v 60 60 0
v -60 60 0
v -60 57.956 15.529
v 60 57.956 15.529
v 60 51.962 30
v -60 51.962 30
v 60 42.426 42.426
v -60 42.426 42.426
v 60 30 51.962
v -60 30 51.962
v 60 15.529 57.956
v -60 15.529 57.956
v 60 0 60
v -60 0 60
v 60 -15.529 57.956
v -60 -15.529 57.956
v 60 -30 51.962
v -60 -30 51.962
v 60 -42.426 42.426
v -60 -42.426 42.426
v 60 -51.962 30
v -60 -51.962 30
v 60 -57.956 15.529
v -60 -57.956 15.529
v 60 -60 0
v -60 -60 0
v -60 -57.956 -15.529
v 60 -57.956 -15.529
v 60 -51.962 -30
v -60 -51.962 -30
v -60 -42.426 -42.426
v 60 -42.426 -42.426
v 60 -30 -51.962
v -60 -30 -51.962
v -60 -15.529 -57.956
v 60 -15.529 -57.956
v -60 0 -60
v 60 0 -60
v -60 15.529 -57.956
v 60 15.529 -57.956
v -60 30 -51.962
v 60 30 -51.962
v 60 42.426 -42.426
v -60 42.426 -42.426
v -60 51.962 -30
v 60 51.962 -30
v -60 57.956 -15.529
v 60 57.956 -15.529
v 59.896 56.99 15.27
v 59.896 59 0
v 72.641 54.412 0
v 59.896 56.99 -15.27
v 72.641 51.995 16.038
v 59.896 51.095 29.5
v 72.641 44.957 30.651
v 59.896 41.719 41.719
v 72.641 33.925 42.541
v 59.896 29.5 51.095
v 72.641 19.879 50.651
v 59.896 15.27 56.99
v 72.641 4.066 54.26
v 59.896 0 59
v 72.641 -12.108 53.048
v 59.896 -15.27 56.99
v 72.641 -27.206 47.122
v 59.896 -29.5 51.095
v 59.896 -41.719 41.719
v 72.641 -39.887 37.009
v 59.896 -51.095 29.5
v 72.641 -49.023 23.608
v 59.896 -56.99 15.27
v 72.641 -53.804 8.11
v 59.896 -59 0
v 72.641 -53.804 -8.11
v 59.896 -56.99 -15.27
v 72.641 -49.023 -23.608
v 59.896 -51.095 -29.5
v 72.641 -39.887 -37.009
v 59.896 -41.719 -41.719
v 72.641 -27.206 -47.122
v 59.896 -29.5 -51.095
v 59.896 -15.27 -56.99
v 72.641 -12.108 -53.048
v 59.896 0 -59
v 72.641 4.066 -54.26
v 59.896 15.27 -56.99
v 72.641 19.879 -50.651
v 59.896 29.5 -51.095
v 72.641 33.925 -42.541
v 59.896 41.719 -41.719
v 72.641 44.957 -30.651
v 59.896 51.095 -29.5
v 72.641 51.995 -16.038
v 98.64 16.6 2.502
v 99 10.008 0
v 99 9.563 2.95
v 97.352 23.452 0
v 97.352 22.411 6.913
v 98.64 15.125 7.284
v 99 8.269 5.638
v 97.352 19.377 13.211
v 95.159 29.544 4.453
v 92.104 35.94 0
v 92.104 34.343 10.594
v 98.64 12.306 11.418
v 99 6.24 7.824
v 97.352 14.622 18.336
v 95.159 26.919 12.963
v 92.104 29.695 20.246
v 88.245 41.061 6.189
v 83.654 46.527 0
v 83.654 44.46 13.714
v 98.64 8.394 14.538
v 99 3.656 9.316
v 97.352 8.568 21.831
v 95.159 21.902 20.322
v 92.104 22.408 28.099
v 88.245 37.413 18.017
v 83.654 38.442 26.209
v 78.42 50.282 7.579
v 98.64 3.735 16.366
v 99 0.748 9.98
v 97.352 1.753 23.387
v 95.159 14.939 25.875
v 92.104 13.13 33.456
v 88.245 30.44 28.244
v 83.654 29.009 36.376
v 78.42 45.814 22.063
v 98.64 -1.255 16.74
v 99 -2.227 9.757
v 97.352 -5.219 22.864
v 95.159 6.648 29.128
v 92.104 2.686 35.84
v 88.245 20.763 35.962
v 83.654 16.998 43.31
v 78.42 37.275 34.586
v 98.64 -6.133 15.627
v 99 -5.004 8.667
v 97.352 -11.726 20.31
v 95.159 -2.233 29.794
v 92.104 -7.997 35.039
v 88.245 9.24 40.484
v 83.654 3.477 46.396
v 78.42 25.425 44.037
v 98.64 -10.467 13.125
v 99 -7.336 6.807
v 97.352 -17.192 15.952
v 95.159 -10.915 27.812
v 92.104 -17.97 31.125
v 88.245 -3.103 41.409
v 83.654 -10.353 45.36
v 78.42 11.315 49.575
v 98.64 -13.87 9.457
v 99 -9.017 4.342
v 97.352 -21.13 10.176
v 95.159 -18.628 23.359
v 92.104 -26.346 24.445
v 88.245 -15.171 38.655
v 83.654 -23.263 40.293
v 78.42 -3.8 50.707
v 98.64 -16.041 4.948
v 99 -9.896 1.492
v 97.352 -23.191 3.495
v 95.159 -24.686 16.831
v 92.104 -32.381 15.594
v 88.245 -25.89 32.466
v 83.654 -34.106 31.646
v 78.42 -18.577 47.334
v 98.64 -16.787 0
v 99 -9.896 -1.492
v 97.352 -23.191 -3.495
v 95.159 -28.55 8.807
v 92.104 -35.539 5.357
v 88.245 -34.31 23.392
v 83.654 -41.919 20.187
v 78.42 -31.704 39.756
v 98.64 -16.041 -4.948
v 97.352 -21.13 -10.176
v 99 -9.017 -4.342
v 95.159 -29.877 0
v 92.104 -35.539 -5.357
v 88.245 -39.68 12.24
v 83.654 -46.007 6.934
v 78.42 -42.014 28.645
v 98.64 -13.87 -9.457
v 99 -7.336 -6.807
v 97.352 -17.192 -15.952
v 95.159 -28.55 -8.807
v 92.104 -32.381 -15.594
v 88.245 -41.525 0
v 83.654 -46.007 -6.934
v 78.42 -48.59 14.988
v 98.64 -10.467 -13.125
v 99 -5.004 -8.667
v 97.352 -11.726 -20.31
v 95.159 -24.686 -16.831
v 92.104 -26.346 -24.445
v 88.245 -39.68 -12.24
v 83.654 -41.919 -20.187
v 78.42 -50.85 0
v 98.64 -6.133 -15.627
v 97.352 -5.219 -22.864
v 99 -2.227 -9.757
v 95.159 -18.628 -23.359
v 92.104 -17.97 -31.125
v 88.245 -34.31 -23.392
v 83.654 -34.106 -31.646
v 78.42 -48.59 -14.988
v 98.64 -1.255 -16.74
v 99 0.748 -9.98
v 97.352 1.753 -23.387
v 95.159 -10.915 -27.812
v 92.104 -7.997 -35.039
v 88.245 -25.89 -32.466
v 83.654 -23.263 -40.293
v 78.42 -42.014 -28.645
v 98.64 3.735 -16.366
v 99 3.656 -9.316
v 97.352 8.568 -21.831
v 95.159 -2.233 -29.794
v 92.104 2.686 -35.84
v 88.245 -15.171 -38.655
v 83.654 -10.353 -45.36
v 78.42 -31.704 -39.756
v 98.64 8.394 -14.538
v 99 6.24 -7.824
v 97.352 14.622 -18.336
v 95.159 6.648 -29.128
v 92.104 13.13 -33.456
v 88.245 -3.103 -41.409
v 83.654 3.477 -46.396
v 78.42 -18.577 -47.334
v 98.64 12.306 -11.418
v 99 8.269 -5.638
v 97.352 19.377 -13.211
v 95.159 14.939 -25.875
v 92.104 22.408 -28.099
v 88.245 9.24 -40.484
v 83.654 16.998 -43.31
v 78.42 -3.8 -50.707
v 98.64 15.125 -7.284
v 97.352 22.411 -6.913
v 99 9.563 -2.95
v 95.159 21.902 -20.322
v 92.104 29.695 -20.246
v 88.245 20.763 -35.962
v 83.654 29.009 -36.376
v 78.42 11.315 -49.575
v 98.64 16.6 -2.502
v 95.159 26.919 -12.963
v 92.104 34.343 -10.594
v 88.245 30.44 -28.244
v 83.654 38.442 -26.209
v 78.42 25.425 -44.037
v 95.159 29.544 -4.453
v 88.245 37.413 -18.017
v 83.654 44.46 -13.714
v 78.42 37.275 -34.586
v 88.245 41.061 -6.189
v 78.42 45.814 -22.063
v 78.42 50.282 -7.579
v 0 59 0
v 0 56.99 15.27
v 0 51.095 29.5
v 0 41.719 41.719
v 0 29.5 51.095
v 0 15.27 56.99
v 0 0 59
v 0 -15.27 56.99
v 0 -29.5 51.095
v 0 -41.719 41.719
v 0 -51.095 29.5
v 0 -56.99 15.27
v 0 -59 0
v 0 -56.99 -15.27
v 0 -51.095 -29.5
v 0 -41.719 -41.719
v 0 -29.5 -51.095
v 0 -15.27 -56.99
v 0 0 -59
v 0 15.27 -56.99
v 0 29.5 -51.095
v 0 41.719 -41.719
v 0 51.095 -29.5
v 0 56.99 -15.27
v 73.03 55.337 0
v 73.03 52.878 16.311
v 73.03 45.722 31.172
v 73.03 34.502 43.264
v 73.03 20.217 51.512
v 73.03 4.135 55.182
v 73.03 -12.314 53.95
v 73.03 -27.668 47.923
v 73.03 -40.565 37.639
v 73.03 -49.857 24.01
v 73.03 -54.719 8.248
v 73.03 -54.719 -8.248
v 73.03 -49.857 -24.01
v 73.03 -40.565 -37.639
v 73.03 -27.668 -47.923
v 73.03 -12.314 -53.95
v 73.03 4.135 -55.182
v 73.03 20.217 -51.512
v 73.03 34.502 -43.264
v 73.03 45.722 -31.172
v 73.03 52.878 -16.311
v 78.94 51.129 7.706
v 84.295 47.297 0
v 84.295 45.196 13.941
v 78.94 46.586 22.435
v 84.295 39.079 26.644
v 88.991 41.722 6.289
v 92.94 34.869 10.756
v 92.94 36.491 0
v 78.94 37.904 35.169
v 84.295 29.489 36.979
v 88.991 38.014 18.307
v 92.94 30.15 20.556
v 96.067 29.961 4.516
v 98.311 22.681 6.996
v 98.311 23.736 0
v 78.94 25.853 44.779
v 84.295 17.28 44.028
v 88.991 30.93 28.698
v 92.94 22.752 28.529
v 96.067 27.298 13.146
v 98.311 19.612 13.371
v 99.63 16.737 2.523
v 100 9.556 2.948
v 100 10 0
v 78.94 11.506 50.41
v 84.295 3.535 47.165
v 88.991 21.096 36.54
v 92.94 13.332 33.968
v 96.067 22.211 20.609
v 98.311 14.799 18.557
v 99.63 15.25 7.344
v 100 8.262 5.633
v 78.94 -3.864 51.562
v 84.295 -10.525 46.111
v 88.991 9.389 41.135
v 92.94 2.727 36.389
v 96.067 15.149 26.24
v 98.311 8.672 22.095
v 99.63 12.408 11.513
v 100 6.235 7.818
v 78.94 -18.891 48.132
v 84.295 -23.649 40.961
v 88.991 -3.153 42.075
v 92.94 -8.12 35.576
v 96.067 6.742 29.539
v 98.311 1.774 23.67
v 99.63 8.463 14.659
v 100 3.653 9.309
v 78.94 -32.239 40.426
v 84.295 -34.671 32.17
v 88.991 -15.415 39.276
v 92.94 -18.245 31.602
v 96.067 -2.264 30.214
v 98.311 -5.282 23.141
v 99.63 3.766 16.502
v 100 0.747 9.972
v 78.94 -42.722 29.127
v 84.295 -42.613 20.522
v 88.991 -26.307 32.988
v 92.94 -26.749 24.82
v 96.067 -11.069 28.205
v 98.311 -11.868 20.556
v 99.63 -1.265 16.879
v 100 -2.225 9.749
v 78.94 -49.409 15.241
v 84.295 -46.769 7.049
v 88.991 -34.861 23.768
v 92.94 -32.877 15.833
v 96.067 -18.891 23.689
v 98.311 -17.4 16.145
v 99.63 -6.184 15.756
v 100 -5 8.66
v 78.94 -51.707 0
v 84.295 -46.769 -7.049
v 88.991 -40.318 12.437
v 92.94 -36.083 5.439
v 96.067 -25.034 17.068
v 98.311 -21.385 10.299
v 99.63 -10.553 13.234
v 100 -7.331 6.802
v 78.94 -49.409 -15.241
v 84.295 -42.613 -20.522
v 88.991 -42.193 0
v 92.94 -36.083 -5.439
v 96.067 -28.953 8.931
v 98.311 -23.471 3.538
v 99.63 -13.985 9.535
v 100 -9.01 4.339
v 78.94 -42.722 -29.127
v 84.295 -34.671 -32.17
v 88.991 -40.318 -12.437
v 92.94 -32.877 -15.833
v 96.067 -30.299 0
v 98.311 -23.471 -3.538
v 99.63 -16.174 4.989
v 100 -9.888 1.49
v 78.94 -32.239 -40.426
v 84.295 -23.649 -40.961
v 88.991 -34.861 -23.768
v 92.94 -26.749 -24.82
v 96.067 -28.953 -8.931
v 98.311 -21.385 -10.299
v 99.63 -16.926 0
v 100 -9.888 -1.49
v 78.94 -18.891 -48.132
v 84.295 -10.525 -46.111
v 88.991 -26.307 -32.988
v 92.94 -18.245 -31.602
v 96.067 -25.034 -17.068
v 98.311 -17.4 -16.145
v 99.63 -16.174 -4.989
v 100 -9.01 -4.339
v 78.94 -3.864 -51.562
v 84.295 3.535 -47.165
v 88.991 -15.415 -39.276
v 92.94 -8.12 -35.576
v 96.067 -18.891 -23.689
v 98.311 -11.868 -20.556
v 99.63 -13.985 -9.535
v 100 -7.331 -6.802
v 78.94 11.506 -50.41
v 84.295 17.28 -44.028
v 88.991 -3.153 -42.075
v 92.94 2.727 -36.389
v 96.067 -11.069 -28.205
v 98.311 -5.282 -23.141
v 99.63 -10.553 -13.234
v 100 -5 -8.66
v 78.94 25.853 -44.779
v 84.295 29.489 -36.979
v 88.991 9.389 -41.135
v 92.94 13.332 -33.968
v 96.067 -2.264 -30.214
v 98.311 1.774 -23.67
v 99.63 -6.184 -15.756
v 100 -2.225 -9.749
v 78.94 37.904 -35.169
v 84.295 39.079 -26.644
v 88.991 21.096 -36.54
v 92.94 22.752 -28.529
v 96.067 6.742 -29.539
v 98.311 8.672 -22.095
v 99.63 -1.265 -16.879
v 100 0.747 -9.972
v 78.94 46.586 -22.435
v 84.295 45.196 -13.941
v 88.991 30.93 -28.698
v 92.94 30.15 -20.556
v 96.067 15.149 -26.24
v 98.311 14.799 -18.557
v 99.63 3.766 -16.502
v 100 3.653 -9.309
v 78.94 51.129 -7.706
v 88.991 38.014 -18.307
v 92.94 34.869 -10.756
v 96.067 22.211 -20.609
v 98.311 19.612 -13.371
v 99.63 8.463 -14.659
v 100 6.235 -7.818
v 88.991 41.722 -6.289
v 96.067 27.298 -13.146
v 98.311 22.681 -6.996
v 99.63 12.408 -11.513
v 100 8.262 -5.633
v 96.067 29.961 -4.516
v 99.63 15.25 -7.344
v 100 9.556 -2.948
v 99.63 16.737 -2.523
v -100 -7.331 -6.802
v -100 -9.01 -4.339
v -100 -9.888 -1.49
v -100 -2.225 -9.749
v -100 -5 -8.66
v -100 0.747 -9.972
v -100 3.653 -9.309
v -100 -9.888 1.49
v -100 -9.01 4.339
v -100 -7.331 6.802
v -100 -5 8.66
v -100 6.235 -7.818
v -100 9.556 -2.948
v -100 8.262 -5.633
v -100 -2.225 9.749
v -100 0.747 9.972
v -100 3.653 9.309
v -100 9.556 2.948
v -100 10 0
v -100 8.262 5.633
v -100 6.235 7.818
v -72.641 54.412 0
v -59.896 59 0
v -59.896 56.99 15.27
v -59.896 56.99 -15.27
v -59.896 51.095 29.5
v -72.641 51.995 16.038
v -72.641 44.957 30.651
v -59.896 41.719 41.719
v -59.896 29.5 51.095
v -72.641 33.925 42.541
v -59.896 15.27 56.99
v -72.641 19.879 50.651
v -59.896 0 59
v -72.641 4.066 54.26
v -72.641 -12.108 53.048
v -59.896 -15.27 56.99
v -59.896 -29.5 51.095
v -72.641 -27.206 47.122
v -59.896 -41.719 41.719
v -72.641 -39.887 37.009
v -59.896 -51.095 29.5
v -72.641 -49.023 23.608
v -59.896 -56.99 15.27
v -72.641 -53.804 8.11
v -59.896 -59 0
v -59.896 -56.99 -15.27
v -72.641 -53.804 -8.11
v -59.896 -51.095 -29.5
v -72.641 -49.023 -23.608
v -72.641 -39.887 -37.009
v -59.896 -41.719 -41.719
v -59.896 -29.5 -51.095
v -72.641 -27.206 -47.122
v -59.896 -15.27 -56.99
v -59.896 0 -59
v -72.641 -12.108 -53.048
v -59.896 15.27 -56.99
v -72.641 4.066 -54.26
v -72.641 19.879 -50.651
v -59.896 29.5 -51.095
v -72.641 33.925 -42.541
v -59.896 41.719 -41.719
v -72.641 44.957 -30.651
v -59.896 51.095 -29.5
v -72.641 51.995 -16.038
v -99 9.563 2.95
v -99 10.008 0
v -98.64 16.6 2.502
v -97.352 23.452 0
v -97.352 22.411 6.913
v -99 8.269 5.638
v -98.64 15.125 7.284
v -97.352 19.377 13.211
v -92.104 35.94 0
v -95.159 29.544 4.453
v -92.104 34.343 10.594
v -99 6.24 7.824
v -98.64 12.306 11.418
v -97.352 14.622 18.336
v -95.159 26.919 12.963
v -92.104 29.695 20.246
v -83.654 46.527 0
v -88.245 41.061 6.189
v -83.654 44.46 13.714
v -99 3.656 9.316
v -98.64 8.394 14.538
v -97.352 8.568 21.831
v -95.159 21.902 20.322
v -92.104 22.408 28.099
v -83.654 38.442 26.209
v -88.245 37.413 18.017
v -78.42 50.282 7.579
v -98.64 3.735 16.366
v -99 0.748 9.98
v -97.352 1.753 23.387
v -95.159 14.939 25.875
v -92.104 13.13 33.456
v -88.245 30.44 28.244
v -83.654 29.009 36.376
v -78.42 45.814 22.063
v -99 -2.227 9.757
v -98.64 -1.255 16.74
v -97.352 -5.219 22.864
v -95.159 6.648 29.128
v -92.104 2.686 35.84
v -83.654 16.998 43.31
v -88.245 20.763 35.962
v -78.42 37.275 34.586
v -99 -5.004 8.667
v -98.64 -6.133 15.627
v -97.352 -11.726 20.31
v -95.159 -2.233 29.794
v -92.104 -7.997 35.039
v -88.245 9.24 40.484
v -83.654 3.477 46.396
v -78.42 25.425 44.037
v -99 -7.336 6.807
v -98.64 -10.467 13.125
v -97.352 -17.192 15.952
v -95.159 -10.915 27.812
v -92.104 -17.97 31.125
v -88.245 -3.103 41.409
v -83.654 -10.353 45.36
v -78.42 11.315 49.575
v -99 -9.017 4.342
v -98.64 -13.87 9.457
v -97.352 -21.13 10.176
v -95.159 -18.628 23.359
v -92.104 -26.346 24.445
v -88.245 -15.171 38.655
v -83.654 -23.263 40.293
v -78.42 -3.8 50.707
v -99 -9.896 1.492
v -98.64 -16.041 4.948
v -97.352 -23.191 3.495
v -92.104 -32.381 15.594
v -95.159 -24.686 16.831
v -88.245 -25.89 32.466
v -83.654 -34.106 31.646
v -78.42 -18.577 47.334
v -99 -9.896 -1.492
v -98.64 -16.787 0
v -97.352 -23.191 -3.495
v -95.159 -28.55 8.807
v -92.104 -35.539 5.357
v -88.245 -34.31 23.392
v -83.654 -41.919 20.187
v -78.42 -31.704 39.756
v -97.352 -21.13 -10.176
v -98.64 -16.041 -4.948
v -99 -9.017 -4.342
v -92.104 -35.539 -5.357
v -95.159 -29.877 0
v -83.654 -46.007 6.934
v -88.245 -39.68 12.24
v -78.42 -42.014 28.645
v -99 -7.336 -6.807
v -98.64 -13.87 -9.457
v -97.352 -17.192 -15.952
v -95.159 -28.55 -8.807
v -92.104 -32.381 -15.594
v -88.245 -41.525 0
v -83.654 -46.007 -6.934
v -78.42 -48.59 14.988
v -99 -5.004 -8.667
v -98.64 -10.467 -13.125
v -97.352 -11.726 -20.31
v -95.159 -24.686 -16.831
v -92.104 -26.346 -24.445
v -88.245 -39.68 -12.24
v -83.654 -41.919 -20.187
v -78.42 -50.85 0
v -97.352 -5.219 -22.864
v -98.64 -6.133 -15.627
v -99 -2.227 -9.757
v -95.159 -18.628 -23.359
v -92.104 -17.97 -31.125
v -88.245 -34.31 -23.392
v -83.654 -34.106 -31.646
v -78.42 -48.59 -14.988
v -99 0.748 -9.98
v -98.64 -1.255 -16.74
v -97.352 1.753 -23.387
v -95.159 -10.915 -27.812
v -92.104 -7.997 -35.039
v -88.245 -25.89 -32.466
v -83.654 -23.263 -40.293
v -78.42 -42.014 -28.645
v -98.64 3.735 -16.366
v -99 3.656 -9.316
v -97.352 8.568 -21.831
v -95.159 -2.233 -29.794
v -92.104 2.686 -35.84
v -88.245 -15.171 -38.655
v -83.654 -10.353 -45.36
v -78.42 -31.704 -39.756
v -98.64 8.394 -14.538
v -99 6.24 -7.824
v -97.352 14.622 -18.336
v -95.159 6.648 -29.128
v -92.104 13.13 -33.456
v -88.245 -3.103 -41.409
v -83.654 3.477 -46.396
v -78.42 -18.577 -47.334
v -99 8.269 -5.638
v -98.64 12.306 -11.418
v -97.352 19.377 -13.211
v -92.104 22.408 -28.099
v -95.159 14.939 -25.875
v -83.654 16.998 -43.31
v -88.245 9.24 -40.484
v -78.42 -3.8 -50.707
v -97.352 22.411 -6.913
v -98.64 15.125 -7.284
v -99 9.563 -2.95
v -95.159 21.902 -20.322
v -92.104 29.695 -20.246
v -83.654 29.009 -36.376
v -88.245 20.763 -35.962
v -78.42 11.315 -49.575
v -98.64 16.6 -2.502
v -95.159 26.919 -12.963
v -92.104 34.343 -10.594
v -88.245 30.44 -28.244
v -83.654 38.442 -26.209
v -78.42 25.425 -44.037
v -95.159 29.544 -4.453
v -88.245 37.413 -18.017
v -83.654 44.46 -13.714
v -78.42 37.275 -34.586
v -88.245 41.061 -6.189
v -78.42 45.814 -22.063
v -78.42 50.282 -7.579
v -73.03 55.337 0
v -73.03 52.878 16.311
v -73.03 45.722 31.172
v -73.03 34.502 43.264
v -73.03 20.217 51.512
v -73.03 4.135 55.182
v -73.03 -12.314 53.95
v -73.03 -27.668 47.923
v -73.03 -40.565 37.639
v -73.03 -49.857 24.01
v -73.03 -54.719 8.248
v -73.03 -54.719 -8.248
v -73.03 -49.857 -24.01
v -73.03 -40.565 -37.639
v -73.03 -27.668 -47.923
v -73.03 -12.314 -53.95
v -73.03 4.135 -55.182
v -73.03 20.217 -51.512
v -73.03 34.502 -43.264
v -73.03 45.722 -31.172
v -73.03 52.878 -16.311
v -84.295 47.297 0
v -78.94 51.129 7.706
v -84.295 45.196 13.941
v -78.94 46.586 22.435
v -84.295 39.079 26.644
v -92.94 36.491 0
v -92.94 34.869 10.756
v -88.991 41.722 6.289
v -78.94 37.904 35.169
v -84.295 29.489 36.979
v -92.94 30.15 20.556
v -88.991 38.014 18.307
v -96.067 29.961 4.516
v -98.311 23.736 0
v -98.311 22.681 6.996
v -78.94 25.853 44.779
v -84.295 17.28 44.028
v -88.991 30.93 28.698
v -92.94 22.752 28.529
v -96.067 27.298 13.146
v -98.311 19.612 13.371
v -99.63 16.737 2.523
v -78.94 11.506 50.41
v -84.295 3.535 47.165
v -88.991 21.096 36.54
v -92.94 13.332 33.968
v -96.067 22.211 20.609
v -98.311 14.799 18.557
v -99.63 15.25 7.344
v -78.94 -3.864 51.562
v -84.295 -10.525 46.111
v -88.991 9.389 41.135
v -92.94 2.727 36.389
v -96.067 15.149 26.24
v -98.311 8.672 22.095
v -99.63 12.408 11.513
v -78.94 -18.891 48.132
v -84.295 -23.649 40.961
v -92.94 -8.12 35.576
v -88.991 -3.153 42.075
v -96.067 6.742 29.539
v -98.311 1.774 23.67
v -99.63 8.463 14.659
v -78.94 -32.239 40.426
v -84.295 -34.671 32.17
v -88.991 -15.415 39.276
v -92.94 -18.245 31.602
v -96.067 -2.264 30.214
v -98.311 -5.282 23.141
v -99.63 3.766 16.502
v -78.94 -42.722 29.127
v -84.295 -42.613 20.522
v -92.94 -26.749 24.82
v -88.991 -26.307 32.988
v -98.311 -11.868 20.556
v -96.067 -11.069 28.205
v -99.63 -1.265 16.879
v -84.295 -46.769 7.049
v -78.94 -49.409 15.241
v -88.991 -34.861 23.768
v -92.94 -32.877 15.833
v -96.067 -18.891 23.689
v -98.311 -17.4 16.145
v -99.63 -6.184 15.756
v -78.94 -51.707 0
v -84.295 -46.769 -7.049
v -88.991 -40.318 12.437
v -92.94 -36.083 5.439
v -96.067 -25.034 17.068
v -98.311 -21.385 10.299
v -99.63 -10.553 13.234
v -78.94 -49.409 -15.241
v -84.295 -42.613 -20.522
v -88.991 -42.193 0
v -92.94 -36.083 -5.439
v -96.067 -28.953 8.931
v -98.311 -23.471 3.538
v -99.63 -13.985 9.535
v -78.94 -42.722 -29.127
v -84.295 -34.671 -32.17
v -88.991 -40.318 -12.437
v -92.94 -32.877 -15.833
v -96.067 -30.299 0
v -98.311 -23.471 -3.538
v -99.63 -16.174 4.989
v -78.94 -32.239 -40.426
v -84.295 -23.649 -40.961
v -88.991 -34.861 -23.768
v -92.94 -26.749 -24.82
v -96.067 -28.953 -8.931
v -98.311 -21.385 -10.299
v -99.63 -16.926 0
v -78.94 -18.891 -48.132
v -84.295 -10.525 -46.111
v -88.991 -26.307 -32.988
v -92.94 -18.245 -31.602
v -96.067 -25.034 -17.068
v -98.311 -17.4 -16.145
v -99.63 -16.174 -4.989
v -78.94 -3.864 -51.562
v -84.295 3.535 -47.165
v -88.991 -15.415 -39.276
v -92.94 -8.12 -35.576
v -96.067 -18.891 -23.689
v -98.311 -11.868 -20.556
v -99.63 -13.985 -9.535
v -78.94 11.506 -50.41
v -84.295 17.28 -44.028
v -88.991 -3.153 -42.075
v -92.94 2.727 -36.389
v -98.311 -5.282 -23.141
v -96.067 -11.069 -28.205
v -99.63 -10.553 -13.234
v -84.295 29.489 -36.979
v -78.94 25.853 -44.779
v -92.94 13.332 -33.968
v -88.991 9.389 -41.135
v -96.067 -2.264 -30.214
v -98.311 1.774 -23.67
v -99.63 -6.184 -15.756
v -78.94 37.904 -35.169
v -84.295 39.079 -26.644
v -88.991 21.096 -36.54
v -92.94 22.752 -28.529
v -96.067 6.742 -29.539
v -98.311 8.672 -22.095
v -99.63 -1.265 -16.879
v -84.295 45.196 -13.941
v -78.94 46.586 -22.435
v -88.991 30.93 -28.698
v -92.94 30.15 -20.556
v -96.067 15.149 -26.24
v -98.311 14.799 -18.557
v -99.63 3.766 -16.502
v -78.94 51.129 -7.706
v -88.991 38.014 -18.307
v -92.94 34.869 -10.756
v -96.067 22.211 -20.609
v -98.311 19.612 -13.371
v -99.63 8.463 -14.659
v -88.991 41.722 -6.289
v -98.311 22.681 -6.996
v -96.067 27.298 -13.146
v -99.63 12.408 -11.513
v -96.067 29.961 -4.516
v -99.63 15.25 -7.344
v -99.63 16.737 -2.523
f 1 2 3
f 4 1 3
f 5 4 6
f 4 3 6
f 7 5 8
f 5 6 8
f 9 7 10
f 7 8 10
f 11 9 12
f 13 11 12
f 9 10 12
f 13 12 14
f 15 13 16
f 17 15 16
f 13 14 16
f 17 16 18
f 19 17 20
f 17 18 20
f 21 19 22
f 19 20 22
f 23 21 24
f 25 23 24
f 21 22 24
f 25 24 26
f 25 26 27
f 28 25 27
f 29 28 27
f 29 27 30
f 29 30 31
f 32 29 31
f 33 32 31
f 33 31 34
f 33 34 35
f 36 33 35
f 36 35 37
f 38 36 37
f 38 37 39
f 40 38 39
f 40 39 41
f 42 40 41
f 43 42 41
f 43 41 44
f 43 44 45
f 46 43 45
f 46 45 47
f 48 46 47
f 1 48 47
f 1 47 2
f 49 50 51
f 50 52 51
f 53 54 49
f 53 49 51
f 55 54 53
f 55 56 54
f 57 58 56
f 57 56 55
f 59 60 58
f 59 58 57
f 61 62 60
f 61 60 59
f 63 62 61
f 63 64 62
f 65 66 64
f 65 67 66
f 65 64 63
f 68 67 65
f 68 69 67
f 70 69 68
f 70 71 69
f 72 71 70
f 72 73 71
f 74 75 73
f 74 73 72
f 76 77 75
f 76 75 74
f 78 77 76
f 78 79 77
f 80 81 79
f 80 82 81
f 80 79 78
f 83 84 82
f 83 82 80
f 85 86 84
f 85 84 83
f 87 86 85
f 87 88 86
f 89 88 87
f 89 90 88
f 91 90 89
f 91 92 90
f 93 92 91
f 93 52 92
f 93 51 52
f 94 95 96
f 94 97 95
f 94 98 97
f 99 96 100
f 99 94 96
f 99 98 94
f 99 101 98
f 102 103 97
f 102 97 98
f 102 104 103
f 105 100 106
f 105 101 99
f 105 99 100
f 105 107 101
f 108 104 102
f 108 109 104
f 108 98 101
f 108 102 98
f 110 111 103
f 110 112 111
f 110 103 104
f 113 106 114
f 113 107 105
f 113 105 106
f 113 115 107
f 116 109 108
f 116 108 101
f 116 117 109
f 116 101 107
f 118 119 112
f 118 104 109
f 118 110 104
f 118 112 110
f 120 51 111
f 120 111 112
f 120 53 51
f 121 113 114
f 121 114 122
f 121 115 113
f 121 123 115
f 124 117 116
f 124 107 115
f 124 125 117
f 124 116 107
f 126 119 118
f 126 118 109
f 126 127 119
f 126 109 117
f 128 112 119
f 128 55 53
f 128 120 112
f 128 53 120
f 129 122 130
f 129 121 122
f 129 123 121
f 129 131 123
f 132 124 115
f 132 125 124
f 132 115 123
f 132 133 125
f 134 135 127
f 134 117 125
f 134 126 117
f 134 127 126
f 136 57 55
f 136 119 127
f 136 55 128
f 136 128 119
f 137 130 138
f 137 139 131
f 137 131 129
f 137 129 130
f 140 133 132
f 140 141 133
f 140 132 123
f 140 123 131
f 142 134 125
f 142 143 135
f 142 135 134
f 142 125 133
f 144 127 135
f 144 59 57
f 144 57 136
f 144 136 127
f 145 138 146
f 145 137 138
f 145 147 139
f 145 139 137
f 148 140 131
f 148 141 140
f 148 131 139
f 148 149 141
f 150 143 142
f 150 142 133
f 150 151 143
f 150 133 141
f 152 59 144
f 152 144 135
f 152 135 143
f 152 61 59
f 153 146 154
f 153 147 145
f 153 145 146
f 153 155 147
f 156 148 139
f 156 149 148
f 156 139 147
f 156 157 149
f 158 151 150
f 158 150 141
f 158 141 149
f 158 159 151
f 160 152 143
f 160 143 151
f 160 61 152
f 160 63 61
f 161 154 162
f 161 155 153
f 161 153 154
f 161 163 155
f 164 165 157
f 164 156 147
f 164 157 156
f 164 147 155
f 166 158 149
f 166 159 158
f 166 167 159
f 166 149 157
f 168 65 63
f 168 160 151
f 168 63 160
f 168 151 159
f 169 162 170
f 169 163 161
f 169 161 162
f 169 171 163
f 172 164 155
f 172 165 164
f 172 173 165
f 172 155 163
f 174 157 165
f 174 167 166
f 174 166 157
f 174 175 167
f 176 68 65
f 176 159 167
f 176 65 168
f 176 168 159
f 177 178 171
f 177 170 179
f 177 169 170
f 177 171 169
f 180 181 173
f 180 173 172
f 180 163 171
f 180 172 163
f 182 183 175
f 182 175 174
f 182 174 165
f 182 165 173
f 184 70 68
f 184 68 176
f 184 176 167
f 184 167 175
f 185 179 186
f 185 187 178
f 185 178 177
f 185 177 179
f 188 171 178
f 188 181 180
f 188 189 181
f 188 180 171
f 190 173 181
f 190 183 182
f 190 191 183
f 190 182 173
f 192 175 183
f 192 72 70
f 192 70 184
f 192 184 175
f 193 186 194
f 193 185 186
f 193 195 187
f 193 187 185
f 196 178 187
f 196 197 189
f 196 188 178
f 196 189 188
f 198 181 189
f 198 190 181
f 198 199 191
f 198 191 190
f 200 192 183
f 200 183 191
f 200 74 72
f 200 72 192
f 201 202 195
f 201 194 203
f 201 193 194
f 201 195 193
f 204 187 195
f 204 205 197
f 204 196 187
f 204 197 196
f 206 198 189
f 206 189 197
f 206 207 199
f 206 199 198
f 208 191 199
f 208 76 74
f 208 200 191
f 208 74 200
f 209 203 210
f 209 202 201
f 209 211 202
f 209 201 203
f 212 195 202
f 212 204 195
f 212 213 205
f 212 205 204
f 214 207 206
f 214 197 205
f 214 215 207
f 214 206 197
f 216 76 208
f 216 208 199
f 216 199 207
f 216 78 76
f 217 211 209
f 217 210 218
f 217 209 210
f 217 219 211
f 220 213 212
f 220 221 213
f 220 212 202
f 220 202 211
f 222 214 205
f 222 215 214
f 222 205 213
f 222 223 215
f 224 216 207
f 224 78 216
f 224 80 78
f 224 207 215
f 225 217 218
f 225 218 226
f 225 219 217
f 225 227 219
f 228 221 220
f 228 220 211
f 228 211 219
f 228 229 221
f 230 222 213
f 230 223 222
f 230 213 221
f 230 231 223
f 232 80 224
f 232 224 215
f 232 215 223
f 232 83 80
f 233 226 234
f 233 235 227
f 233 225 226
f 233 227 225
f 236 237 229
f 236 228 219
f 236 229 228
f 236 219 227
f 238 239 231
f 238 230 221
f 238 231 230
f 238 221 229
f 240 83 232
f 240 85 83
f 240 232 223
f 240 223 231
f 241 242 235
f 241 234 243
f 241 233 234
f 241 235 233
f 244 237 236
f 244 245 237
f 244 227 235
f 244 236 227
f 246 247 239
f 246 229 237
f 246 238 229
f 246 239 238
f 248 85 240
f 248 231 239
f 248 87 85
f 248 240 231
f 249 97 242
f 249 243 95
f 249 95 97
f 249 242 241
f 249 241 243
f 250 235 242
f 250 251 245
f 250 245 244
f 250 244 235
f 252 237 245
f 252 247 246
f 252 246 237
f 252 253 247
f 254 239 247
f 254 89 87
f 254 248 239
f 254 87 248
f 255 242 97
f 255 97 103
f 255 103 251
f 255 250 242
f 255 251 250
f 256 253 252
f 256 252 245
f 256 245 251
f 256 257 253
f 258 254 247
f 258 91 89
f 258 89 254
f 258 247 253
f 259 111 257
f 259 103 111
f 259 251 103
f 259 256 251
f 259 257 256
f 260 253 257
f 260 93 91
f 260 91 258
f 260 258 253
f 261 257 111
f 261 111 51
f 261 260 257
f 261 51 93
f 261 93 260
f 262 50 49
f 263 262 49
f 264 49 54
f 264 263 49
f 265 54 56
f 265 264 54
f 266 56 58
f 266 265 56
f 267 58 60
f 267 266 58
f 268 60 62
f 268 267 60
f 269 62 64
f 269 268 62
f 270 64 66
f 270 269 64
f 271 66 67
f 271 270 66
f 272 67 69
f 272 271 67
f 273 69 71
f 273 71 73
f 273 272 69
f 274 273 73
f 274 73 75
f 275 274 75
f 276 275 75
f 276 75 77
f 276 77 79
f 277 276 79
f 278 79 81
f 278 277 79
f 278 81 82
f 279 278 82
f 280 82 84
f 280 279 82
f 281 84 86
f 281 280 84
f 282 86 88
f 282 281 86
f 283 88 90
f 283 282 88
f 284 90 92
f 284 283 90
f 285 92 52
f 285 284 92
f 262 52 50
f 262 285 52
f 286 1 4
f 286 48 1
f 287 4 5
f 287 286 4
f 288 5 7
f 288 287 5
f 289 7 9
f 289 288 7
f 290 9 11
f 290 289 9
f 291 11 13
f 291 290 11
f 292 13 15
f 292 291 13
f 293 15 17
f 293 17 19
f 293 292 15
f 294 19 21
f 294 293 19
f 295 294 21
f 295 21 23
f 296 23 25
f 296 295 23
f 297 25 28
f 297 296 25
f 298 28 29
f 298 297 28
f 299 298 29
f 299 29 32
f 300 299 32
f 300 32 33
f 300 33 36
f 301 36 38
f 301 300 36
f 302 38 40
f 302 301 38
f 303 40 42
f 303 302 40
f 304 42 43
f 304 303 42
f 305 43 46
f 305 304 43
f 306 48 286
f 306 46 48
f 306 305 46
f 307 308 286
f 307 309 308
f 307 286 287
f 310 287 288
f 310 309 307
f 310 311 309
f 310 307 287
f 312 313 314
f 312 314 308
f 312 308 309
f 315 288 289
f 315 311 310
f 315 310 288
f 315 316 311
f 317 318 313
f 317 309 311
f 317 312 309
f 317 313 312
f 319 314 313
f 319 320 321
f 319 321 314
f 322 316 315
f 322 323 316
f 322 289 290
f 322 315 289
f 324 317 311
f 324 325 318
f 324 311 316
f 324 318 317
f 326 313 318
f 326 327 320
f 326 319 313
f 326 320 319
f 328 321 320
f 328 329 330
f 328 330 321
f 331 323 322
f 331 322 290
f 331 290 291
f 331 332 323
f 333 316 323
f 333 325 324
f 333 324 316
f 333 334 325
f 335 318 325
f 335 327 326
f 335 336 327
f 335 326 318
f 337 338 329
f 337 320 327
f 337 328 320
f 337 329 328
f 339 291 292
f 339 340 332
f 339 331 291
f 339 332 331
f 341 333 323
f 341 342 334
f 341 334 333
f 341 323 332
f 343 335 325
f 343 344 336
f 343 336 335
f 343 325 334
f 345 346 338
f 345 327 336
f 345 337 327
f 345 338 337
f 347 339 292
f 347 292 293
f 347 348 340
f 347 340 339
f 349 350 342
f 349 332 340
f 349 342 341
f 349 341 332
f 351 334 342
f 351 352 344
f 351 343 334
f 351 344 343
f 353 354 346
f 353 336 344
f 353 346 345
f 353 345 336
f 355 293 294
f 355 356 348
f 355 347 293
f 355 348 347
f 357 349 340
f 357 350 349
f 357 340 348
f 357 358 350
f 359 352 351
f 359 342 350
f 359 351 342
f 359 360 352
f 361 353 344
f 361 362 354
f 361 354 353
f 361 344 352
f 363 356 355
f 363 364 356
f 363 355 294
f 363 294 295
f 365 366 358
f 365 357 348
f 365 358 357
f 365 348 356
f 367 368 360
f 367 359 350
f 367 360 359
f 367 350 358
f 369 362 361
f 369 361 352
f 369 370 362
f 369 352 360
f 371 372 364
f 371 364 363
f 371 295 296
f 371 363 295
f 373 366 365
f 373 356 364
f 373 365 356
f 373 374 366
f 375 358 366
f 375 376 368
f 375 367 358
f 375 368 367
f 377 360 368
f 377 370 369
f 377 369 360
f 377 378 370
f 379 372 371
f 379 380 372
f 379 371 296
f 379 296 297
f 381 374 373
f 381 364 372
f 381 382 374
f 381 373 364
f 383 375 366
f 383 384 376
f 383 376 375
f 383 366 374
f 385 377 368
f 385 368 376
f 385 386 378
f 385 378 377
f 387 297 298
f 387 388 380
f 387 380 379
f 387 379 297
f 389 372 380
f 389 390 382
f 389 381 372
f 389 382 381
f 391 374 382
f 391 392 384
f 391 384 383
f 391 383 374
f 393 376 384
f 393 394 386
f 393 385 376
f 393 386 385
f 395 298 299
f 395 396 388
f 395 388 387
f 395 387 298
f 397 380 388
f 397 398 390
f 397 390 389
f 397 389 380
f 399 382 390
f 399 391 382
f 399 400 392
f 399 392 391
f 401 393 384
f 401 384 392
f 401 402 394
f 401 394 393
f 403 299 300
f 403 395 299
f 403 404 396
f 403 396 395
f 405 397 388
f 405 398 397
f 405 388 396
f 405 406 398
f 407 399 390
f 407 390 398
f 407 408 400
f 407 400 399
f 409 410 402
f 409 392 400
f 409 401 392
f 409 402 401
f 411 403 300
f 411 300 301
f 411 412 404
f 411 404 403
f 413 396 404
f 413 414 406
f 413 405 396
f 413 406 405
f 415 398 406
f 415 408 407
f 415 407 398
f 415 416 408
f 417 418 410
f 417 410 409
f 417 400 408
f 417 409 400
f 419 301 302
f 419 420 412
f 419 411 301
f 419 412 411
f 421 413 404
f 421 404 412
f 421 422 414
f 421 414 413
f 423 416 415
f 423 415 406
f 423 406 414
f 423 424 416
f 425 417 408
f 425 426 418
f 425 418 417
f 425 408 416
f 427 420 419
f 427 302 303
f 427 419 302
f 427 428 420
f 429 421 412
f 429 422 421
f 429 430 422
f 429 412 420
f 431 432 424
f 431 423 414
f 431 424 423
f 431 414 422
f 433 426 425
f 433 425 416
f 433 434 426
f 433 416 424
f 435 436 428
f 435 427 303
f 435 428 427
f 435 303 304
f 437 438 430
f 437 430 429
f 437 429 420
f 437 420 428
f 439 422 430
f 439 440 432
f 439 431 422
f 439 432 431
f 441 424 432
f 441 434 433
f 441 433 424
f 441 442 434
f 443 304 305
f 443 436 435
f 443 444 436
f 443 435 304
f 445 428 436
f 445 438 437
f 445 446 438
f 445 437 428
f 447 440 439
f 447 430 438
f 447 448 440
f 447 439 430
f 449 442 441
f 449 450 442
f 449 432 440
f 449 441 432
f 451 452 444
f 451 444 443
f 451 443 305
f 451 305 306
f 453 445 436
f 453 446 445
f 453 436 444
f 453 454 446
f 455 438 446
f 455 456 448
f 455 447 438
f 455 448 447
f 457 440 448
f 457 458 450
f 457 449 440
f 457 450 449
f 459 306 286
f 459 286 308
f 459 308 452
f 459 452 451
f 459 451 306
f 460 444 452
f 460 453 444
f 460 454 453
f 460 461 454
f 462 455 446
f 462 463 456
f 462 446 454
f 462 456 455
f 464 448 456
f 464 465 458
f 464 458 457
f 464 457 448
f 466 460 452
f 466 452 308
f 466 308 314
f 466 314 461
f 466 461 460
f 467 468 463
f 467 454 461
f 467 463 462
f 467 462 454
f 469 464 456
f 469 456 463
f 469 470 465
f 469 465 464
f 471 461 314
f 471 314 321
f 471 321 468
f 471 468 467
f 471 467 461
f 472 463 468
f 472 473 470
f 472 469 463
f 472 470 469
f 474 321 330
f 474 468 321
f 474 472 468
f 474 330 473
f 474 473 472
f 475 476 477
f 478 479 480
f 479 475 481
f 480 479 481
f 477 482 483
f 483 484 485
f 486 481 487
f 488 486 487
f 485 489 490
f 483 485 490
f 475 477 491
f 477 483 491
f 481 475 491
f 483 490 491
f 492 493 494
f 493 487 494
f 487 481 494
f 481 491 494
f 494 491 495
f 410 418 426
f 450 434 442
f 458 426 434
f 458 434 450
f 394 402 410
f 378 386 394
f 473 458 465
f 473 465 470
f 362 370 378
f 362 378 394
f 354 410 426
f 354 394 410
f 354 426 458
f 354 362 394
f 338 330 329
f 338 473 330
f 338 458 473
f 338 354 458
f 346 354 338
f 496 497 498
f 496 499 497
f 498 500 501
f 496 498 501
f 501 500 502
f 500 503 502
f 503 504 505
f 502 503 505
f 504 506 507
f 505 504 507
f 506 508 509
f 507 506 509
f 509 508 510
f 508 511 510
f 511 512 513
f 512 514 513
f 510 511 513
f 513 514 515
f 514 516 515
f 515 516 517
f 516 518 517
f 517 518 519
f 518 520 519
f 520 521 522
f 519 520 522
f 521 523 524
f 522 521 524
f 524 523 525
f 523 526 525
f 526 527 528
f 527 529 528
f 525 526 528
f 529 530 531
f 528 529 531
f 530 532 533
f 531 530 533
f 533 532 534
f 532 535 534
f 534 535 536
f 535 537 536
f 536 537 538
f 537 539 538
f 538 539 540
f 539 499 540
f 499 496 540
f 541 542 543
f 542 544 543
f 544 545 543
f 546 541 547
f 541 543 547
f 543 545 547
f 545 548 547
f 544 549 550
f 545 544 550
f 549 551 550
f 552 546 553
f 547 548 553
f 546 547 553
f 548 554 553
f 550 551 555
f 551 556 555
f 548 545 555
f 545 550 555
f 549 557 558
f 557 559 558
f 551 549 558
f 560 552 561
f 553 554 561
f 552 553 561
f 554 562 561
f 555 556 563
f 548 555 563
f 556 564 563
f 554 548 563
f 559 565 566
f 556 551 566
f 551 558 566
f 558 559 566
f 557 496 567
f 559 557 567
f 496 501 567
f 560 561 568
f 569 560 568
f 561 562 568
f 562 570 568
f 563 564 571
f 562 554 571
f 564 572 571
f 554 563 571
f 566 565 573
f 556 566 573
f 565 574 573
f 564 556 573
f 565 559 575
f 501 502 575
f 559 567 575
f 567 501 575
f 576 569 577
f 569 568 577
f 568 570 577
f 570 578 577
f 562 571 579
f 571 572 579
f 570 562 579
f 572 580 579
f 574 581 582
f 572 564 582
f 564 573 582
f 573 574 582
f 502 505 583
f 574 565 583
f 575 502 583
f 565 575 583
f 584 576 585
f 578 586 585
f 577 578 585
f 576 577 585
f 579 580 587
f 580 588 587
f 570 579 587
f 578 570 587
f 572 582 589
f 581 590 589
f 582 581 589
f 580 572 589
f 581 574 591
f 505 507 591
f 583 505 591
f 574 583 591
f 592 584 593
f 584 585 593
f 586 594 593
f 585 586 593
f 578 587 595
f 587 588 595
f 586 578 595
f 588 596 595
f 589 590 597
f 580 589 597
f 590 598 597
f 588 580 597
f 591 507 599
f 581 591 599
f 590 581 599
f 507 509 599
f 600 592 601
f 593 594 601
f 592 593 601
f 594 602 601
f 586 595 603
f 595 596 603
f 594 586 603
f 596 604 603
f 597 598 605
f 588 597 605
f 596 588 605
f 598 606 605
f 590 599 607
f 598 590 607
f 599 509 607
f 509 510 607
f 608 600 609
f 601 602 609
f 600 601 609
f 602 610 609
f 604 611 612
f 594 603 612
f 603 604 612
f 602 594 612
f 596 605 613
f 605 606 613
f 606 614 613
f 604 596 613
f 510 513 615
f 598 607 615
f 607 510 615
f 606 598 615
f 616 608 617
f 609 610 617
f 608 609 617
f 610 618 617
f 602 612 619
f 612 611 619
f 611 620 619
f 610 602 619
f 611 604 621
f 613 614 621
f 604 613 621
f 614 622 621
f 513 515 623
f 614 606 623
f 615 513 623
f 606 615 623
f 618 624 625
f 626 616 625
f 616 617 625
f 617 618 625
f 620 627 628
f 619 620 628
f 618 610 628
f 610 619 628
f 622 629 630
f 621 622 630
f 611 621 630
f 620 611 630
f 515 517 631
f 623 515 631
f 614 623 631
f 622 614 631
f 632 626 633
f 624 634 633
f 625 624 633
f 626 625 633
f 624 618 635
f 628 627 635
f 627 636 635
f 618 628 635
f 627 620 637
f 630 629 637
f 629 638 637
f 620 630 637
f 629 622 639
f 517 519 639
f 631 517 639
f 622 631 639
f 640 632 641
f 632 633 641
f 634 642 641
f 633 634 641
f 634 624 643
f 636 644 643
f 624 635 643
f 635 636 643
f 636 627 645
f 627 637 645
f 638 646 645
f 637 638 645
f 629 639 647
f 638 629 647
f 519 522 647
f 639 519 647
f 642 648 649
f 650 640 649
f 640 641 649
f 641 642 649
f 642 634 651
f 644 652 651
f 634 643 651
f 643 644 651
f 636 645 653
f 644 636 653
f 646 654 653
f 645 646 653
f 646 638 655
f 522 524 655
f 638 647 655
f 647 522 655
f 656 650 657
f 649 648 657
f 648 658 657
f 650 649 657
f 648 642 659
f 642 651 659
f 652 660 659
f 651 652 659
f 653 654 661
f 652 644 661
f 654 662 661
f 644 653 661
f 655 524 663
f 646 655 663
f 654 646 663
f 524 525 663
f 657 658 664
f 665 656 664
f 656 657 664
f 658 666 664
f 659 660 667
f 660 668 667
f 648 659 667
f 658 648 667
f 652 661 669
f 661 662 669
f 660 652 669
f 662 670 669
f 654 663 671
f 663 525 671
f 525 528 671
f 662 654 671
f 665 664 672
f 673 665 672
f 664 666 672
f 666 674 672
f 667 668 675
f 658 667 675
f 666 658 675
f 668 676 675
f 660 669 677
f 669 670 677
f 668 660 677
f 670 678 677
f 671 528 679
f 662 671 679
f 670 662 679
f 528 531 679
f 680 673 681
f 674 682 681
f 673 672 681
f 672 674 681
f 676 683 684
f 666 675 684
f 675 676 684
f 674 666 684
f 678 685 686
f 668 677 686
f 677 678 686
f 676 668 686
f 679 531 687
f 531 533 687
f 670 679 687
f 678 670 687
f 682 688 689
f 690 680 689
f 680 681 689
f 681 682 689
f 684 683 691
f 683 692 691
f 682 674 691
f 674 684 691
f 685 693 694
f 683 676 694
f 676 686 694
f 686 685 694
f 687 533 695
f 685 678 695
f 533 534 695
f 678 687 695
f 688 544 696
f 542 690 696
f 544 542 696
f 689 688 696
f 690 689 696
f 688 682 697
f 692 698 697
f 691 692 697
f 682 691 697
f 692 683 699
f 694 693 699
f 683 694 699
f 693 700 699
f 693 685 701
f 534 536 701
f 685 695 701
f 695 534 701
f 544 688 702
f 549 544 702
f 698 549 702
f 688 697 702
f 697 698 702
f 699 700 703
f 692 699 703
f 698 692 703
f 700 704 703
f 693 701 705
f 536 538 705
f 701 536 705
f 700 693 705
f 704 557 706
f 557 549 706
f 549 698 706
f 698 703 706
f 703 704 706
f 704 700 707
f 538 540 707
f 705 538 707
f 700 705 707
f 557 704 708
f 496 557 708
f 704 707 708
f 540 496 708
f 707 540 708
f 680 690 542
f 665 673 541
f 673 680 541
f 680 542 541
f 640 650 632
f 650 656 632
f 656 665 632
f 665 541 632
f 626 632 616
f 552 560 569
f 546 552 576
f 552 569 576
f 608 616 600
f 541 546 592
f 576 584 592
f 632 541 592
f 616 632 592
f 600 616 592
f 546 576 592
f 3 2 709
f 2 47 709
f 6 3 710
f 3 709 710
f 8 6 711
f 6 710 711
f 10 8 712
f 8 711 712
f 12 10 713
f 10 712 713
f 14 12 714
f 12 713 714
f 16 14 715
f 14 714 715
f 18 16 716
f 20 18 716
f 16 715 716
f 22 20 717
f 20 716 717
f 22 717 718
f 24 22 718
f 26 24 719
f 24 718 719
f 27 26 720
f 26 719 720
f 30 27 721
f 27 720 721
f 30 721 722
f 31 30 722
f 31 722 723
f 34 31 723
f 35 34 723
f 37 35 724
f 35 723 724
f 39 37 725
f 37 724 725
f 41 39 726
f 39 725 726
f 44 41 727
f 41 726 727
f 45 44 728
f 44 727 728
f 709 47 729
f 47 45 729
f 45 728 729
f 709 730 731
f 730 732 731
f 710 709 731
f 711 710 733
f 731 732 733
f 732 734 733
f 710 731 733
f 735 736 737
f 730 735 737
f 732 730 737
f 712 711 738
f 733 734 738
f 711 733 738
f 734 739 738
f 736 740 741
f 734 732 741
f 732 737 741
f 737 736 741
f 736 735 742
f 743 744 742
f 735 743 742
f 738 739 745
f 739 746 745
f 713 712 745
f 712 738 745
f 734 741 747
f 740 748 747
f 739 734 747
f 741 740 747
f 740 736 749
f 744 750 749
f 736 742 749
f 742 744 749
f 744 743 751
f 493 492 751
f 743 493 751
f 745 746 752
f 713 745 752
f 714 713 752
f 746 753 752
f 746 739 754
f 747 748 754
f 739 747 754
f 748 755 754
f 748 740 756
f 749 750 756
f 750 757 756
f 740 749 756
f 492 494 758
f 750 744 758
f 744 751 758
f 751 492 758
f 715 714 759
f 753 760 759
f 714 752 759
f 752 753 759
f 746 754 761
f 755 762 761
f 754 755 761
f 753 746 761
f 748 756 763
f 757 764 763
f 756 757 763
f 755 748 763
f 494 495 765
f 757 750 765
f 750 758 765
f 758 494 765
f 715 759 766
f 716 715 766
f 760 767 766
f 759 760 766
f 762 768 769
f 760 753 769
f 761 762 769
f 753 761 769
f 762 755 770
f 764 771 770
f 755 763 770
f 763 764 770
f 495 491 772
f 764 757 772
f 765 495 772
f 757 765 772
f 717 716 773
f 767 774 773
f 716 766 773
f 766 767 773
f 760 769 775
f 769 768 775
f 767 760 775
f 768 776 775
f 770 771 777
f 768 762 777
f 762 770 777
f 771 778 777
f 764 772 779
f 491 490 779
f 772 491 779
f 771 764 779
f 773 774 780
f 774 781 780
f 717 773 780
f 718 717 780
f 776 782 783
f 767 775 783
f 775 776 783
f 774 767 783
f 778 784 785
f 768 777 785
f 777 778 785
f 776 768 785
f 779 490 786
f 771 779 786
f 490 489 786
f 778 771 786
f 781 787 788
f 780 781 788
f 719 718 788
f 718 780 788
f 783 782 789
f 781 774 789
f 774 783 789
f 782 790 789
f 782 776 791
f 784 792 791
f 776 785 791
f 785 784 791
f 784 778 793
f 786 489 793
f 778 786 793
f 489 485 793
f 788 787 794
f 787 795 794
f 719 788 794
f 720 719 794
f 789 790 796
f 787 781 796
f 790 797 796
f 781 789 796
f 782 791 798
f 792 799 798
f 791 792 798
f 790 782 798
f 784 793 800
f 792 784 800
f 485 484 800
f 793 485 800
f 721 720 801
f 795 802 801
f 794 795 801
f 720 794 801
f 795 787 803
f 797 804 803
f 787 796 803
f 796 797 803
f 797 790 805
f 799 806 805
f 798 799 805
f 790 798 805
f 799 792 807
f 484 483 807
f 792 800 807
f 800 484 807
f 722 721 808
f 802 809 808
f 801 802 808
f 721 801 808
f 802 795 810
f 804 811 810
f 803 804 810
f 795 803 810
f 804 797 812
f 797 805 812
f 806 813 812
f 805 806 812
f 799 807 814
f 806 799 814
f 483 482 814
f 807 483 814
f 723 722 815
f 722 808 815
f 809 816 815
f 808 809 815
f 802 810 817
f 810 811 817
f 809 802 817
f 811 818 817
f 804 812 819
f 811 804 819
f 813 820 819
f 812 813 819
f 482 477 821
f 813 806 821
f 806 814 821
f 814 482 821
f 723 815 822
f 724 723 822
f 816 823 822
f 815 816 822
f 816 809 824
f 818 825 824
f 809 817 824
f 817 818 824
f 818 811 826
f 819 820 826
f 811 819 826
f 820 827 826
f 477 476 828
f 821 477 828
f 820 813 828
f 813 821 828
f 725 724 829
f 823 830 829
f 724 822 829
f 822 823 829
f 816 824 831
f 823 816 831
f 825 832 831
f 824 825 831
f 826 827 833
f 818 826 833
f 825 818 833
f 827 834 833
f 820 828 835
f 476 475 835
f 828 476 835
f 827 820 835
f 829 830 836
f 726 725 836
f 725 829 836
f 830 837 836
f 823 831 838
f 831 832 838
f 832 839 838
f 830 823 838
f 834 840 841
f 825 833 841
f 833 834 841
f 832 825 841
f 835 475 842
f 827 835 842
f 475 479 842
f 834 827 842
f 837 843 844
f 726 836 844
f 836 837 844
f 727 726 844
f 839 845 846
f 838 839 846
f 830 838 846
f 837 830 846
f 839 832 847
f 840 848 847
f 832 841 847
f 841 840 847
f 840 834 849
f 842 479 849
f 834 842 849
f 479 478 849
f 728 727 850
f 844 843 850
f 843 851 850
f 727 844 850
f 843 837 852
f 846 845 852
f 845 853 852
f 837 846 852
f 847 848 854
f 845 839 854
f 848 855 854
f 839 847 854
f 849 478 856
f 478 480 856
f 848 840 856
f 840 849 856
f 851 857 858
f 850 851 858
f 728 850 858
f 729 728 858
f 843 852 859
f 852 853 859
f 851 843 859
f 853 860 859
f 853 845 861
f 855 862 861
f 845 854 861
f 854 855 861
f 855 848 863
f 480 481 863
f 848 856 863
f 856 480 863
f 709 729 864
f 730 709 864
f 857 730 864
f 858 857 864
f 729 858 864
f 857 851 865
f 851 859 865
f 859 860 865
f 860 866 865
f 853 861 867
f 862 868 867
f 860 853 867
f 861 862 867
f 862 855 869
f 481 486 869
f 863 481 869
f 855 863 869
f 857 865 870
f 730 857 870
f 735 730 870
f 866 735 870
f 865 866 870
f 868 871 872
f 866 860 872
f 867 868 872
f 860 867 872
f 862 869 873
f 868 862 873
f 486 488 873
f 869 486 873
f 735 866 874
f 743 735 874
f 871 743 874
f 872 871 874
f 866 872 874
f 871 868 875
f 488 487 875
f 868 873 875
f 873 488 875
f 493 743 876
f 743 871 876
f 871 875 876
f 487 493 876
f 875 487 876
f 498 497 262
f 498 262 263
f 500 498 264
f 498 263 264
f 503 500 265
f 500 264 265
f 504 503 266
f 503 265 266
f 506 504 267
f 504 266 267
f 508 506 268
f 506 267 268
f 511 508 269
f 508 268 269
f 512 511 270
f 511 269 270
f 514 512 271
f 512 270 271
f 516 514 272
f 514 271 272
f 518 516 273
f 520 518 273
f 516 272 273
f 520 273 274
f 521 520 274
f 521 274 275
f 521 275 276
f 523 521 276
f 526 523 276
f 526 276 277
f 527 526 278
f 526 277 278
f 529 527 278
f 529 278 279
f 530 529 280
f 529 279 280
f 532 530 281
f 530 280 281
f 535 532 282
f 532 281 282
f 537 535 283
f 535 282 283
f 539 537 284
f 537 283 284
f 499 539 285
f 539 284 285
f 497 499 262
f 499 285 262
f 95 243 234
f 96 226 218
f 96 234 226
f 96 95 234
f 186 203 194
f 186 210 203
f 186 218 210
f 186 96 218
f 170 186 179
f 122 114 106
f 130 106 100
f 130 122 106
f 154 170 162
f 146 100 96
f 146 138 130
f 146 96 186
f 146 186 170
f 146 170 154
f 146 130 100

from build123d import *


with BuildPart() as part:
    # Sketch1 → Revolve-Thin1 (revolve)
    with BuildSketch(Plane(origin=(0, 0, 0), x_dir=(1, 0, 0), z_dir=(0, 1, 0))):
        with BuildLine():
            Line((0, 59), (59.896326585, 59))
            ThreePointArc((59.896326585, 59), (88.244744032, 41.525060748), (99, 10.007910772))
            Line((99, 10.007910772), (99, 0))
            Line((99, 0), (100, 0))
            Line((100, 0), (100, 10))
            ThreePointArc((100, 10), (88.991132396, 42.192905916), (60, 60))
            Line((60, 60), (0, 60))
            Line((0, 60), (0, 59))
        make_face()
    revolve_thin1 = revolve(axis=Axis((0, 0, 0), (1, 0, 0)))

    # Mirror1: Revolve-Thin1 across plane
    add(revolve_thin1.mirror(Plane(origin=(0, 0, -59), x_dir=(0, 0, 1), z_dir=(-1, 0, 0))))


solid = part.part
